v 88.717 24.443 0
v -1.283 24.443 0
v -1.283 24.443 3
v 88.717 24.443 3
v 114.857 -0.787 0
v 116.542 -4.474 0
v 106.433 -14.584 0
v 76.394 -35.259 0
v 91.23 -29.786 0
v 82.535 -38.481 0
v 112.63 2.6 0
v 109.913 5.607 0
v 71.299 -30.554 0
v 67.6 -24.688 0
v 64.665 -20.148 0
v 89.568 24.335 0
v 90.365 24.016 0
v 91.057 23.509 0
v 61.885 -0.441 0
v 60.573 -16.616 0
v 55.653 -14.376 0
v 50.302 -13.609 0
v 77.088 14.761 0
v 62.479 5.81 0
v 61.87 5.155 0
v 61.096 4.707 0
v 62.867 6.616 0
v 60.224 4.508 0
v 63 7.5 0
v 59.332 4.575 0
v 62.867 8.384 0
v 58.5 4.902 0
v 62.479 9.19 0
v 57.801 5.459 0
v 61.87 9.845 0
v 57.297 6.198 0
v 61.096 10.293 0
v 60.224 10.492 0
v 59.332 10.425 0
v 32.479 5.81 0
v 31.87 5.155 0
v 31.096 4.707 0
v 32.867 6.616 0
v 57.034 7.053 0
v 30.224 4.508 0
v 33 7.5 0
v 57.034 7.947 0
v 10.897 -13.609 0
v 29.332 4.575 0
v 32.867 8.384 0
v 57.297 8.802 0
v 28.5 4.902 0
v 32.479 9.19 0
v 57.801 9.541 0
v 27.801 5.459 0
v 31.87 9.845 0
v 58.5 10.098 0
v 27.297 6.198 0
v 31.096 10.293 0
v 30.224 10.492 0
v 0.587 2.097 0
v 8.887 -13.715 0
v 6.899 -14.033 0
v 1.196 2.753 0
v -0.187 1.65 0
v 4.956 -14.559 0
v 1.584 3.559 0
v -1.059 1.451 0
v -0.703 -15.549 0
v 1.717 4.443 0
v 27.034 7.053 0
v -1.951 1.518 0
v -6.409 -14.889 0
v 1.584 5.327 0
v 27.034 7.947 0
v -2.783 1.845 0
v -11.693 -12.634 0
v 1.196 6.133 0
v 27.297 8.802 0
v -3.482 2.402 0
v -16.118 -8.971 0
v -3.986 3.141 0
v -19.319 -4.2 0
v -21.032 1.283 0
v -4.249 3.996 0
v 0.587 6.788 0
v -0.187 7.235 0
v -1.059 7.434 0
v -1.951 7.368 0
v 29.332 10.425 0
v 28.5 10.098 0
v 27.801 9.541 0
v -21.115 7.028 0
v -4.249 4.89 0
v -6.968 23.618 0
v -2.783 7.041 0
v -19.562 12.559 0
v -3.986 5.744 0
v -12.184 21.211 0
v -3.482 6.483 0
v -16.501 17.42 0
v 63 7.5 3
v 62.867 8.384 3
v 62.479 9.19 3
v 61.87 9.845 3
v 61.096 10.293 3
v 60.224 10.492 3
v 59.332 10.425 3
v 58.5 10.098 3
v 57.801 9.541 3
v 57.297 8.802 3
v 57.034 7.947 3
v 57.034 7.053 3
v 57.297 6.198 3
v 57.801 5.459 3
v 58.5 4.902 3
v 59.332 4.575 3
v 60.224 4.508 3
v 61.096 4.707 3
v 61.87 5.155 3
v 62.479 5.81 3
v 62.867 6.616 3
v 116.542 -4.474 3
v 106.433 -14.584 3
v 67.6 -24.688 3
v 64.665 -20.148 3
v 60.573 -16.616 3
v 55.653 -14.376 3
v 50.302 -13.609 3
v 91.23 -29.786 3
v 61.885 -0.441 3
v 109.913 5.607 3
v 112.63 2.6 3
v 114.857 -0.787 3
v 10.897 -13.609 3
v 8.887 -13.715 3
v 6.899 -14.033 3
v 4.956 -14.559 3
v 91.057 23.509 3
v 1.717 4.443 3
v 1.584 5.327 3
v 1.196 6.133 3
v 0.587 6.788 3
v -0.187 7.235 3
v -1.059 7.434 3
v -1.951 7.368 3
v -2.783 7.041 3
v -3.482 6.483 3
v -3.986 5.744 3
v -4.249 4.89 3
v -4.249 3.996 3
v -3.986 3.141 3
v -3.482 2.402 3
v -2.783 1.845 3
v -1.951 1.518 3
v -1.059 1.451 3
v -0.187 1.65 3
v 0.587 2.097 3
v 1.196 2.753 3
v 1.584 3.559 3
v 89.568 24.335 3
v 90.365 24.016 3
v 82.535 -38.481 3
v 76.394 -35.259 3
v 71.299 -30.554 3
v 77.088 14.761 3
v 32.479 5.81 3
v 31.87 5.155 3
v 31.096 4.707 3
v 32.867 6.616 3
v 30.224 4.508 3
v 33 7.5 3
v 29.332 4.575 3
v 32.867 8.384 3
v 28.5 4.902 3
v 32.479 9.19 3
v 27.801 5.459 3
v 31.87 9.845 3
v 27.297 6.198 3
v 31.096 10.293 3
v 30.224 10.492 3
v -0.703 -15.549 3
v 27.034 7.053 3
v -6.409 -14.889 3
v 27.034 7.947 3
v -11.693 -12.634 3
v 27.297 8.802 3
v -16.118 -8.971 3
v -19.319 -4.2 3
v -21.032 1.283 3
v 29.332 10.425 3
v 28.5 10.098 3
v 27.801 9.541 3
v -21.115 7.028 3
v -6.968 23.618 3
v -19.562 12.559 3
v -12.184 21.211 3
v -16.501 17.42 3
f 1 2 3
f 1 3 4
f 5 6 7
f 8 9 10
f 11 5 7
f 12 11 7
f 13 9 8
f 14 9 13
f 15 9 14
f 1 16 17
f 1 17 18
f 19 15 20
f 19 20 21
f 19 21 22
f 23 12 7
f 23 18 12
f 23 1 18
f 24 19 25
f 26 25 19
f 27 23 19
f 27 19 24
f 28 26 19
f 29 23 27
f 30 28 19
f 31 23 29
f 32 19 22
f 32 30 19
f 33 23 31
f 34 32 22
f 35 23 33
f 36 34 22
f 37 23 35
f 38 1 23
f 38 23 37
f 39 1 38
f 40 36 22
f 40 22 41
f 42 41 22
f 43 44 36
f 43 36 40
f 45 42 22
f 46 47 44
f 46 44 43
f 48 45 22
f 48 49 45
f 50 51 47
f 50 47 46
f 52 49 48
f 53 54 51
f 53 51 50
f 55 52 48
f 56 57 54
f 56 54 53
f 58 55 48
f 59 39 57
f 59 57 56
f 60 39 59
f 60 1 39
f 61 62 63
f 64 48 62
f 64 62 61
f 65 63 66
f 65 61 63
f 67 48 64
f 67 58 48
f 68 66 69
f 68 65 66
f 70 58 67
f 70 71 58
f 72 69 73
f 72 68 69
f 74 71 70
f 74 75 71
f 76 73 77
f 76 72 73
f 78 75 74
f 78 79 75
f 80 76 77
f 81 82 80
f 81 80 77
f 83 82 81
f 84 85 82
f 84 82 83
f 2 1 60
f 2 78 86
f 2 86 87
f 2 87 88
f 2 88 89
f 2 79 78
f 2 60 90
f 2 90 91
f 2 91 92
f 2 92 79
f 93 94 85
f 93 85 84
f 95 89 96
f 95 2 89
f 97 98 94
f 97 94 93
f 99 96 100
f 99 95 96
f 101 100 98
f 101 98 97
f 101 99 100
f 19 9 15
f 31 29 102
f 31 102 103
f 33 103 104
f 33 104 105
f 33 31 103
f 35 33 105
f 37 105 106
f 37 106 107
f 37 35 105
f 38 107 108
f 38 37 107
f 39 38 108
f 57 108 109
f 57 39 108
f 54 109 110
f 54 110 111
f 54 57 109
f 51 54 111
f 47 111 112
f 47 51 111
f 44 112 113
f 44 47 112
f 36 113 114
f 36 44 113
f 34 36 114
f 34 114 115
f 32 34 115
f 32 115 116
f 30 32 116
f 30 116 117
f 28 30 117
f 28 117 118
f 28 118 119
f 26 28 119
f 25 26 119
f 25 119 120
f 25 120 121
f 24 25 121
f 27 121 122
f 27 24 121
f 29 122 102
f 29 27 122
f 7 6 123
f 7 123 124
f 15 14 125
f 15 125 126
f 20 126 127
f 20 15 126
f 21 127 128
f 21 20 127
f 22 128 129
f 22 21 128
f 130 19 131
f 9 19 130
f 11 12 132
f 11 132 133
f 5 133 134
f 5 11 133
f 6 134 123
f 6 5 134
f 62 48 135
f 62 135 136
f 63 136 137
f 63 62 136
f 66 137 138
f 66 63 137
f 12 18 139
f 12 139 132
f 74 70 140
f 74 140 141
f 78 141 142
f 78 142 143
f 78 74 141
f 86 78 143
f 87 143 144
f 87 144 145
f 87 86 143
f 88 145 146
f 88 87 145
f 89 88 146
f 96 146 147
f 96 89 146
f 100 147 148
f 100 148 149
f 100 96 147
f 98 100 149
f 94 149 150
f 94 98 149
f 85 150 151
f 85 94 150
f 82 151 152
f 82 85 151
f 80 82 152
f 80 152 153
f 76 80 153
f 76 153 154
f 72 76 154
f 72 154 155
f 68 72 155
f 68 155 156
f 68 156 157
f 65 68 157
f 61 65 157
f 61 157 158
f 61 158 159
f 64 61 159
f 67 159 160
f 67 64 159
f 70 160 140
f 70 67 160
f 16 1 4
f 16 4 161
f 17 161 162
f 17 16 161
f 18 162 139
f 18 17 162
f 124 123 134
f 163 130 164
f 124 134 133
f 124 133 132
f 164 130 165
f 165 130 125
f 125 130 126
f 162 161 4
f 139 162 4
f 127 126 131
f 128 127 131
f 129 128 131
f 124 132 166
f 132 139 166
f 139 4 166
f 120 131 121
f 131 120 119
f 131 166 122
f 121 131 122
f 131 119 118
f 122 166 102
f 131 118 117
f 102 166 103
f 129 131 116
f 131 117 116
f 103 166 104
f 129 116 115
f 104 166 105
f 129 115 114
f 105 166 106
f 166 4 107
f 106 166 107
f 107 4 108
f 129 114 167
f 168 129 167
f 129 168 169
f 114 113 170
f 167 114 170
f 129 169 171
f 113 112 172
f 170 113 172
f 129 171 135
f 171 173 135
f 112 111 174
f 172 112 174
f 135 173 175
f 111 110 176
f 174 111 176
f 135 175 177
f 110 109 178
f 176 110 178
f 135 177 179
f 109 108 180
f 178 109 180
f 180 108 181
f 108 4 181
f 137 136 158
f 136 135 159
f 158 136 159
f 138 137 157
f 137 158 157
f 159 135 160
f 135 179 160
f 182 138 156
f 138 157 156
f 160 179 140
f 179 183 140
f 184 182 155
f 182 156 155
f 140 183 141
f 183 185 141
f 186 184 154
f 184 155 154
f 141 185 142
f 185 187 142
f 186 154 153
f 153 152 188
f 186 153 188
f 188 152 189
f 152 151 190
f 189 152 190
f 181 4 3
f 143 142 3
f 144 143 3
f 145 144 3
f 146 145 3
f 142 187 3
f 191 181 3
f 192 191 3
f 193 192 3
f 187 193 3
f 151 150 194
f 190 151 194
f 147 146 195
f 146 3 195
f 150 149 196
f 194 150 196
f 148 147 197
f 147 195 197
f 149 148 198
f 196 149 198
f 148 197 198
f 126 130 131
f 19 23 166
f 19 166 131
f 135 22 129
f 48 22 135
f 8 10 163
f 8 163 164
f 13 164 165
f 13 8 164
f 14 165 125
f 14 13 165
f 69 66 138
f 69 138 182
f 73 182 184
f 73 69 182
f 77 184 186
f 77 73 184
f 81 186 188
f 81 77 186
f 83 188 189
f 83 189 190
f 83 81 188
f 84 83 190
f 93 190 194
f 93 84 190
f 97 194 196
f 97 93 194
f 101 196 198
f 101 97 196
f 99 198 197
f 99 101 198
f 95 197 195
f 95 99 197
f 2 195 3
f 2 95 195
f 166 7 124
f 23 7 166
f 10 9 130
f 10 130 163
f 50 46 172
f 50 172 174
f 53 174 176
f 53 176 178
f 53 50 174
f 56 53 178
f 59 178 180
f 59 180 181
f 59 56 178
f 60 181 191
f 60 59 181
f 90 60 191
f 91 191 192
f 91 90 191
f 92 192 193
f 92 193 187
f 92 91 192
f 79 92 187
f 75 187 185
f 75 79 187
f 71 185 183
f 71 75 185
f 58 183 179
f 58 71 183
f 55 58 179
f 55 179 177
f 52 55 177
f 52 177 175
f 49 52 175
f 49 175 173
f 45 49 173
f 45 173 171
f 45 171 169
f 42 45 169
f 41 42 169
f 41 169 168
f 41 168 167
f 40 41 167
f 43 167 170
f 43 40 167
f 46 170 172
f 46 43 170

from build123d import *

# Parameters (mm, degrees)
SKETCH1_R           = 3
BOSS_EXTRUDE1_DEPTH = 3


with BuildPart() as part:
    # Sketch1 → Boss-Extrude1 (new body)
    with BuildSketch(Plane.XY):
        with BuildLine():
            Line((77.087645862, 14.761424984), (61.884850067, -0.441370812))
            Line((61.884850067, -0.441370812), (91.229781486, -29.786302231))
            Line((91.229781486, -29.786302231), (82.534788155, -38.481295563))
            ThreePointArc((82.534788155, -38.481295563), (73.691938632, -33.074158425), (67.599954135, -24.688405948))
            ThreePointArc((67.599954135, -24.688405948), (60.573216822, -16.61605207), (50.302224608, -13.608619059))
            Line((50.302224608, -13.608619059), (10.897118181, -13.608619059))
            ThreePointArc((10.897118181, -13.608619059), (7.888998842, -13.847714786), (4.956418896, -14.558997838))
            ThreePointArc((4.956418896, -14.558997838), (-21.031882132, 1.283456288), (-1.283000467, 24.442834864))
            Line((-1.283000467, 24.442834864), (88.716999533, 24.442834864))
            ThreePointArc((88.716999533, 24.442834864), (89.976795131, 24.200731926), (91.057113295, 23.508914432))
            Line((91.057113295, 23.508914432), (109.912759821, 5.607389522))
            ThreePointArc((109.912759821, 5.607389522), (113.808768074, 0.948896759), (116.541784176, -4.474299542))
            Line((116.541784176, -4.474299542), (106.432577282, -14.583506436))
            Line((106.432577282, -14.583506436), (77.087645862, 14.761424984))
        make_face()
        with Locations((30, 7.5)):
            Circle(SKETCH1_R, mode=Mode.SUBTRACT)
        with Locations((-1.283000467, 4.442834864)):
            Circle(SKETCH1_R, mode=Mode.SUBTRACT)
        with Locations((60, 7.5)):
            Circle(SKETCH1_R, mode=Mode.SUBTRACT)
    extrude(amount=BOSS_EXTRUDE1_DEPTH)


solid = part.part
